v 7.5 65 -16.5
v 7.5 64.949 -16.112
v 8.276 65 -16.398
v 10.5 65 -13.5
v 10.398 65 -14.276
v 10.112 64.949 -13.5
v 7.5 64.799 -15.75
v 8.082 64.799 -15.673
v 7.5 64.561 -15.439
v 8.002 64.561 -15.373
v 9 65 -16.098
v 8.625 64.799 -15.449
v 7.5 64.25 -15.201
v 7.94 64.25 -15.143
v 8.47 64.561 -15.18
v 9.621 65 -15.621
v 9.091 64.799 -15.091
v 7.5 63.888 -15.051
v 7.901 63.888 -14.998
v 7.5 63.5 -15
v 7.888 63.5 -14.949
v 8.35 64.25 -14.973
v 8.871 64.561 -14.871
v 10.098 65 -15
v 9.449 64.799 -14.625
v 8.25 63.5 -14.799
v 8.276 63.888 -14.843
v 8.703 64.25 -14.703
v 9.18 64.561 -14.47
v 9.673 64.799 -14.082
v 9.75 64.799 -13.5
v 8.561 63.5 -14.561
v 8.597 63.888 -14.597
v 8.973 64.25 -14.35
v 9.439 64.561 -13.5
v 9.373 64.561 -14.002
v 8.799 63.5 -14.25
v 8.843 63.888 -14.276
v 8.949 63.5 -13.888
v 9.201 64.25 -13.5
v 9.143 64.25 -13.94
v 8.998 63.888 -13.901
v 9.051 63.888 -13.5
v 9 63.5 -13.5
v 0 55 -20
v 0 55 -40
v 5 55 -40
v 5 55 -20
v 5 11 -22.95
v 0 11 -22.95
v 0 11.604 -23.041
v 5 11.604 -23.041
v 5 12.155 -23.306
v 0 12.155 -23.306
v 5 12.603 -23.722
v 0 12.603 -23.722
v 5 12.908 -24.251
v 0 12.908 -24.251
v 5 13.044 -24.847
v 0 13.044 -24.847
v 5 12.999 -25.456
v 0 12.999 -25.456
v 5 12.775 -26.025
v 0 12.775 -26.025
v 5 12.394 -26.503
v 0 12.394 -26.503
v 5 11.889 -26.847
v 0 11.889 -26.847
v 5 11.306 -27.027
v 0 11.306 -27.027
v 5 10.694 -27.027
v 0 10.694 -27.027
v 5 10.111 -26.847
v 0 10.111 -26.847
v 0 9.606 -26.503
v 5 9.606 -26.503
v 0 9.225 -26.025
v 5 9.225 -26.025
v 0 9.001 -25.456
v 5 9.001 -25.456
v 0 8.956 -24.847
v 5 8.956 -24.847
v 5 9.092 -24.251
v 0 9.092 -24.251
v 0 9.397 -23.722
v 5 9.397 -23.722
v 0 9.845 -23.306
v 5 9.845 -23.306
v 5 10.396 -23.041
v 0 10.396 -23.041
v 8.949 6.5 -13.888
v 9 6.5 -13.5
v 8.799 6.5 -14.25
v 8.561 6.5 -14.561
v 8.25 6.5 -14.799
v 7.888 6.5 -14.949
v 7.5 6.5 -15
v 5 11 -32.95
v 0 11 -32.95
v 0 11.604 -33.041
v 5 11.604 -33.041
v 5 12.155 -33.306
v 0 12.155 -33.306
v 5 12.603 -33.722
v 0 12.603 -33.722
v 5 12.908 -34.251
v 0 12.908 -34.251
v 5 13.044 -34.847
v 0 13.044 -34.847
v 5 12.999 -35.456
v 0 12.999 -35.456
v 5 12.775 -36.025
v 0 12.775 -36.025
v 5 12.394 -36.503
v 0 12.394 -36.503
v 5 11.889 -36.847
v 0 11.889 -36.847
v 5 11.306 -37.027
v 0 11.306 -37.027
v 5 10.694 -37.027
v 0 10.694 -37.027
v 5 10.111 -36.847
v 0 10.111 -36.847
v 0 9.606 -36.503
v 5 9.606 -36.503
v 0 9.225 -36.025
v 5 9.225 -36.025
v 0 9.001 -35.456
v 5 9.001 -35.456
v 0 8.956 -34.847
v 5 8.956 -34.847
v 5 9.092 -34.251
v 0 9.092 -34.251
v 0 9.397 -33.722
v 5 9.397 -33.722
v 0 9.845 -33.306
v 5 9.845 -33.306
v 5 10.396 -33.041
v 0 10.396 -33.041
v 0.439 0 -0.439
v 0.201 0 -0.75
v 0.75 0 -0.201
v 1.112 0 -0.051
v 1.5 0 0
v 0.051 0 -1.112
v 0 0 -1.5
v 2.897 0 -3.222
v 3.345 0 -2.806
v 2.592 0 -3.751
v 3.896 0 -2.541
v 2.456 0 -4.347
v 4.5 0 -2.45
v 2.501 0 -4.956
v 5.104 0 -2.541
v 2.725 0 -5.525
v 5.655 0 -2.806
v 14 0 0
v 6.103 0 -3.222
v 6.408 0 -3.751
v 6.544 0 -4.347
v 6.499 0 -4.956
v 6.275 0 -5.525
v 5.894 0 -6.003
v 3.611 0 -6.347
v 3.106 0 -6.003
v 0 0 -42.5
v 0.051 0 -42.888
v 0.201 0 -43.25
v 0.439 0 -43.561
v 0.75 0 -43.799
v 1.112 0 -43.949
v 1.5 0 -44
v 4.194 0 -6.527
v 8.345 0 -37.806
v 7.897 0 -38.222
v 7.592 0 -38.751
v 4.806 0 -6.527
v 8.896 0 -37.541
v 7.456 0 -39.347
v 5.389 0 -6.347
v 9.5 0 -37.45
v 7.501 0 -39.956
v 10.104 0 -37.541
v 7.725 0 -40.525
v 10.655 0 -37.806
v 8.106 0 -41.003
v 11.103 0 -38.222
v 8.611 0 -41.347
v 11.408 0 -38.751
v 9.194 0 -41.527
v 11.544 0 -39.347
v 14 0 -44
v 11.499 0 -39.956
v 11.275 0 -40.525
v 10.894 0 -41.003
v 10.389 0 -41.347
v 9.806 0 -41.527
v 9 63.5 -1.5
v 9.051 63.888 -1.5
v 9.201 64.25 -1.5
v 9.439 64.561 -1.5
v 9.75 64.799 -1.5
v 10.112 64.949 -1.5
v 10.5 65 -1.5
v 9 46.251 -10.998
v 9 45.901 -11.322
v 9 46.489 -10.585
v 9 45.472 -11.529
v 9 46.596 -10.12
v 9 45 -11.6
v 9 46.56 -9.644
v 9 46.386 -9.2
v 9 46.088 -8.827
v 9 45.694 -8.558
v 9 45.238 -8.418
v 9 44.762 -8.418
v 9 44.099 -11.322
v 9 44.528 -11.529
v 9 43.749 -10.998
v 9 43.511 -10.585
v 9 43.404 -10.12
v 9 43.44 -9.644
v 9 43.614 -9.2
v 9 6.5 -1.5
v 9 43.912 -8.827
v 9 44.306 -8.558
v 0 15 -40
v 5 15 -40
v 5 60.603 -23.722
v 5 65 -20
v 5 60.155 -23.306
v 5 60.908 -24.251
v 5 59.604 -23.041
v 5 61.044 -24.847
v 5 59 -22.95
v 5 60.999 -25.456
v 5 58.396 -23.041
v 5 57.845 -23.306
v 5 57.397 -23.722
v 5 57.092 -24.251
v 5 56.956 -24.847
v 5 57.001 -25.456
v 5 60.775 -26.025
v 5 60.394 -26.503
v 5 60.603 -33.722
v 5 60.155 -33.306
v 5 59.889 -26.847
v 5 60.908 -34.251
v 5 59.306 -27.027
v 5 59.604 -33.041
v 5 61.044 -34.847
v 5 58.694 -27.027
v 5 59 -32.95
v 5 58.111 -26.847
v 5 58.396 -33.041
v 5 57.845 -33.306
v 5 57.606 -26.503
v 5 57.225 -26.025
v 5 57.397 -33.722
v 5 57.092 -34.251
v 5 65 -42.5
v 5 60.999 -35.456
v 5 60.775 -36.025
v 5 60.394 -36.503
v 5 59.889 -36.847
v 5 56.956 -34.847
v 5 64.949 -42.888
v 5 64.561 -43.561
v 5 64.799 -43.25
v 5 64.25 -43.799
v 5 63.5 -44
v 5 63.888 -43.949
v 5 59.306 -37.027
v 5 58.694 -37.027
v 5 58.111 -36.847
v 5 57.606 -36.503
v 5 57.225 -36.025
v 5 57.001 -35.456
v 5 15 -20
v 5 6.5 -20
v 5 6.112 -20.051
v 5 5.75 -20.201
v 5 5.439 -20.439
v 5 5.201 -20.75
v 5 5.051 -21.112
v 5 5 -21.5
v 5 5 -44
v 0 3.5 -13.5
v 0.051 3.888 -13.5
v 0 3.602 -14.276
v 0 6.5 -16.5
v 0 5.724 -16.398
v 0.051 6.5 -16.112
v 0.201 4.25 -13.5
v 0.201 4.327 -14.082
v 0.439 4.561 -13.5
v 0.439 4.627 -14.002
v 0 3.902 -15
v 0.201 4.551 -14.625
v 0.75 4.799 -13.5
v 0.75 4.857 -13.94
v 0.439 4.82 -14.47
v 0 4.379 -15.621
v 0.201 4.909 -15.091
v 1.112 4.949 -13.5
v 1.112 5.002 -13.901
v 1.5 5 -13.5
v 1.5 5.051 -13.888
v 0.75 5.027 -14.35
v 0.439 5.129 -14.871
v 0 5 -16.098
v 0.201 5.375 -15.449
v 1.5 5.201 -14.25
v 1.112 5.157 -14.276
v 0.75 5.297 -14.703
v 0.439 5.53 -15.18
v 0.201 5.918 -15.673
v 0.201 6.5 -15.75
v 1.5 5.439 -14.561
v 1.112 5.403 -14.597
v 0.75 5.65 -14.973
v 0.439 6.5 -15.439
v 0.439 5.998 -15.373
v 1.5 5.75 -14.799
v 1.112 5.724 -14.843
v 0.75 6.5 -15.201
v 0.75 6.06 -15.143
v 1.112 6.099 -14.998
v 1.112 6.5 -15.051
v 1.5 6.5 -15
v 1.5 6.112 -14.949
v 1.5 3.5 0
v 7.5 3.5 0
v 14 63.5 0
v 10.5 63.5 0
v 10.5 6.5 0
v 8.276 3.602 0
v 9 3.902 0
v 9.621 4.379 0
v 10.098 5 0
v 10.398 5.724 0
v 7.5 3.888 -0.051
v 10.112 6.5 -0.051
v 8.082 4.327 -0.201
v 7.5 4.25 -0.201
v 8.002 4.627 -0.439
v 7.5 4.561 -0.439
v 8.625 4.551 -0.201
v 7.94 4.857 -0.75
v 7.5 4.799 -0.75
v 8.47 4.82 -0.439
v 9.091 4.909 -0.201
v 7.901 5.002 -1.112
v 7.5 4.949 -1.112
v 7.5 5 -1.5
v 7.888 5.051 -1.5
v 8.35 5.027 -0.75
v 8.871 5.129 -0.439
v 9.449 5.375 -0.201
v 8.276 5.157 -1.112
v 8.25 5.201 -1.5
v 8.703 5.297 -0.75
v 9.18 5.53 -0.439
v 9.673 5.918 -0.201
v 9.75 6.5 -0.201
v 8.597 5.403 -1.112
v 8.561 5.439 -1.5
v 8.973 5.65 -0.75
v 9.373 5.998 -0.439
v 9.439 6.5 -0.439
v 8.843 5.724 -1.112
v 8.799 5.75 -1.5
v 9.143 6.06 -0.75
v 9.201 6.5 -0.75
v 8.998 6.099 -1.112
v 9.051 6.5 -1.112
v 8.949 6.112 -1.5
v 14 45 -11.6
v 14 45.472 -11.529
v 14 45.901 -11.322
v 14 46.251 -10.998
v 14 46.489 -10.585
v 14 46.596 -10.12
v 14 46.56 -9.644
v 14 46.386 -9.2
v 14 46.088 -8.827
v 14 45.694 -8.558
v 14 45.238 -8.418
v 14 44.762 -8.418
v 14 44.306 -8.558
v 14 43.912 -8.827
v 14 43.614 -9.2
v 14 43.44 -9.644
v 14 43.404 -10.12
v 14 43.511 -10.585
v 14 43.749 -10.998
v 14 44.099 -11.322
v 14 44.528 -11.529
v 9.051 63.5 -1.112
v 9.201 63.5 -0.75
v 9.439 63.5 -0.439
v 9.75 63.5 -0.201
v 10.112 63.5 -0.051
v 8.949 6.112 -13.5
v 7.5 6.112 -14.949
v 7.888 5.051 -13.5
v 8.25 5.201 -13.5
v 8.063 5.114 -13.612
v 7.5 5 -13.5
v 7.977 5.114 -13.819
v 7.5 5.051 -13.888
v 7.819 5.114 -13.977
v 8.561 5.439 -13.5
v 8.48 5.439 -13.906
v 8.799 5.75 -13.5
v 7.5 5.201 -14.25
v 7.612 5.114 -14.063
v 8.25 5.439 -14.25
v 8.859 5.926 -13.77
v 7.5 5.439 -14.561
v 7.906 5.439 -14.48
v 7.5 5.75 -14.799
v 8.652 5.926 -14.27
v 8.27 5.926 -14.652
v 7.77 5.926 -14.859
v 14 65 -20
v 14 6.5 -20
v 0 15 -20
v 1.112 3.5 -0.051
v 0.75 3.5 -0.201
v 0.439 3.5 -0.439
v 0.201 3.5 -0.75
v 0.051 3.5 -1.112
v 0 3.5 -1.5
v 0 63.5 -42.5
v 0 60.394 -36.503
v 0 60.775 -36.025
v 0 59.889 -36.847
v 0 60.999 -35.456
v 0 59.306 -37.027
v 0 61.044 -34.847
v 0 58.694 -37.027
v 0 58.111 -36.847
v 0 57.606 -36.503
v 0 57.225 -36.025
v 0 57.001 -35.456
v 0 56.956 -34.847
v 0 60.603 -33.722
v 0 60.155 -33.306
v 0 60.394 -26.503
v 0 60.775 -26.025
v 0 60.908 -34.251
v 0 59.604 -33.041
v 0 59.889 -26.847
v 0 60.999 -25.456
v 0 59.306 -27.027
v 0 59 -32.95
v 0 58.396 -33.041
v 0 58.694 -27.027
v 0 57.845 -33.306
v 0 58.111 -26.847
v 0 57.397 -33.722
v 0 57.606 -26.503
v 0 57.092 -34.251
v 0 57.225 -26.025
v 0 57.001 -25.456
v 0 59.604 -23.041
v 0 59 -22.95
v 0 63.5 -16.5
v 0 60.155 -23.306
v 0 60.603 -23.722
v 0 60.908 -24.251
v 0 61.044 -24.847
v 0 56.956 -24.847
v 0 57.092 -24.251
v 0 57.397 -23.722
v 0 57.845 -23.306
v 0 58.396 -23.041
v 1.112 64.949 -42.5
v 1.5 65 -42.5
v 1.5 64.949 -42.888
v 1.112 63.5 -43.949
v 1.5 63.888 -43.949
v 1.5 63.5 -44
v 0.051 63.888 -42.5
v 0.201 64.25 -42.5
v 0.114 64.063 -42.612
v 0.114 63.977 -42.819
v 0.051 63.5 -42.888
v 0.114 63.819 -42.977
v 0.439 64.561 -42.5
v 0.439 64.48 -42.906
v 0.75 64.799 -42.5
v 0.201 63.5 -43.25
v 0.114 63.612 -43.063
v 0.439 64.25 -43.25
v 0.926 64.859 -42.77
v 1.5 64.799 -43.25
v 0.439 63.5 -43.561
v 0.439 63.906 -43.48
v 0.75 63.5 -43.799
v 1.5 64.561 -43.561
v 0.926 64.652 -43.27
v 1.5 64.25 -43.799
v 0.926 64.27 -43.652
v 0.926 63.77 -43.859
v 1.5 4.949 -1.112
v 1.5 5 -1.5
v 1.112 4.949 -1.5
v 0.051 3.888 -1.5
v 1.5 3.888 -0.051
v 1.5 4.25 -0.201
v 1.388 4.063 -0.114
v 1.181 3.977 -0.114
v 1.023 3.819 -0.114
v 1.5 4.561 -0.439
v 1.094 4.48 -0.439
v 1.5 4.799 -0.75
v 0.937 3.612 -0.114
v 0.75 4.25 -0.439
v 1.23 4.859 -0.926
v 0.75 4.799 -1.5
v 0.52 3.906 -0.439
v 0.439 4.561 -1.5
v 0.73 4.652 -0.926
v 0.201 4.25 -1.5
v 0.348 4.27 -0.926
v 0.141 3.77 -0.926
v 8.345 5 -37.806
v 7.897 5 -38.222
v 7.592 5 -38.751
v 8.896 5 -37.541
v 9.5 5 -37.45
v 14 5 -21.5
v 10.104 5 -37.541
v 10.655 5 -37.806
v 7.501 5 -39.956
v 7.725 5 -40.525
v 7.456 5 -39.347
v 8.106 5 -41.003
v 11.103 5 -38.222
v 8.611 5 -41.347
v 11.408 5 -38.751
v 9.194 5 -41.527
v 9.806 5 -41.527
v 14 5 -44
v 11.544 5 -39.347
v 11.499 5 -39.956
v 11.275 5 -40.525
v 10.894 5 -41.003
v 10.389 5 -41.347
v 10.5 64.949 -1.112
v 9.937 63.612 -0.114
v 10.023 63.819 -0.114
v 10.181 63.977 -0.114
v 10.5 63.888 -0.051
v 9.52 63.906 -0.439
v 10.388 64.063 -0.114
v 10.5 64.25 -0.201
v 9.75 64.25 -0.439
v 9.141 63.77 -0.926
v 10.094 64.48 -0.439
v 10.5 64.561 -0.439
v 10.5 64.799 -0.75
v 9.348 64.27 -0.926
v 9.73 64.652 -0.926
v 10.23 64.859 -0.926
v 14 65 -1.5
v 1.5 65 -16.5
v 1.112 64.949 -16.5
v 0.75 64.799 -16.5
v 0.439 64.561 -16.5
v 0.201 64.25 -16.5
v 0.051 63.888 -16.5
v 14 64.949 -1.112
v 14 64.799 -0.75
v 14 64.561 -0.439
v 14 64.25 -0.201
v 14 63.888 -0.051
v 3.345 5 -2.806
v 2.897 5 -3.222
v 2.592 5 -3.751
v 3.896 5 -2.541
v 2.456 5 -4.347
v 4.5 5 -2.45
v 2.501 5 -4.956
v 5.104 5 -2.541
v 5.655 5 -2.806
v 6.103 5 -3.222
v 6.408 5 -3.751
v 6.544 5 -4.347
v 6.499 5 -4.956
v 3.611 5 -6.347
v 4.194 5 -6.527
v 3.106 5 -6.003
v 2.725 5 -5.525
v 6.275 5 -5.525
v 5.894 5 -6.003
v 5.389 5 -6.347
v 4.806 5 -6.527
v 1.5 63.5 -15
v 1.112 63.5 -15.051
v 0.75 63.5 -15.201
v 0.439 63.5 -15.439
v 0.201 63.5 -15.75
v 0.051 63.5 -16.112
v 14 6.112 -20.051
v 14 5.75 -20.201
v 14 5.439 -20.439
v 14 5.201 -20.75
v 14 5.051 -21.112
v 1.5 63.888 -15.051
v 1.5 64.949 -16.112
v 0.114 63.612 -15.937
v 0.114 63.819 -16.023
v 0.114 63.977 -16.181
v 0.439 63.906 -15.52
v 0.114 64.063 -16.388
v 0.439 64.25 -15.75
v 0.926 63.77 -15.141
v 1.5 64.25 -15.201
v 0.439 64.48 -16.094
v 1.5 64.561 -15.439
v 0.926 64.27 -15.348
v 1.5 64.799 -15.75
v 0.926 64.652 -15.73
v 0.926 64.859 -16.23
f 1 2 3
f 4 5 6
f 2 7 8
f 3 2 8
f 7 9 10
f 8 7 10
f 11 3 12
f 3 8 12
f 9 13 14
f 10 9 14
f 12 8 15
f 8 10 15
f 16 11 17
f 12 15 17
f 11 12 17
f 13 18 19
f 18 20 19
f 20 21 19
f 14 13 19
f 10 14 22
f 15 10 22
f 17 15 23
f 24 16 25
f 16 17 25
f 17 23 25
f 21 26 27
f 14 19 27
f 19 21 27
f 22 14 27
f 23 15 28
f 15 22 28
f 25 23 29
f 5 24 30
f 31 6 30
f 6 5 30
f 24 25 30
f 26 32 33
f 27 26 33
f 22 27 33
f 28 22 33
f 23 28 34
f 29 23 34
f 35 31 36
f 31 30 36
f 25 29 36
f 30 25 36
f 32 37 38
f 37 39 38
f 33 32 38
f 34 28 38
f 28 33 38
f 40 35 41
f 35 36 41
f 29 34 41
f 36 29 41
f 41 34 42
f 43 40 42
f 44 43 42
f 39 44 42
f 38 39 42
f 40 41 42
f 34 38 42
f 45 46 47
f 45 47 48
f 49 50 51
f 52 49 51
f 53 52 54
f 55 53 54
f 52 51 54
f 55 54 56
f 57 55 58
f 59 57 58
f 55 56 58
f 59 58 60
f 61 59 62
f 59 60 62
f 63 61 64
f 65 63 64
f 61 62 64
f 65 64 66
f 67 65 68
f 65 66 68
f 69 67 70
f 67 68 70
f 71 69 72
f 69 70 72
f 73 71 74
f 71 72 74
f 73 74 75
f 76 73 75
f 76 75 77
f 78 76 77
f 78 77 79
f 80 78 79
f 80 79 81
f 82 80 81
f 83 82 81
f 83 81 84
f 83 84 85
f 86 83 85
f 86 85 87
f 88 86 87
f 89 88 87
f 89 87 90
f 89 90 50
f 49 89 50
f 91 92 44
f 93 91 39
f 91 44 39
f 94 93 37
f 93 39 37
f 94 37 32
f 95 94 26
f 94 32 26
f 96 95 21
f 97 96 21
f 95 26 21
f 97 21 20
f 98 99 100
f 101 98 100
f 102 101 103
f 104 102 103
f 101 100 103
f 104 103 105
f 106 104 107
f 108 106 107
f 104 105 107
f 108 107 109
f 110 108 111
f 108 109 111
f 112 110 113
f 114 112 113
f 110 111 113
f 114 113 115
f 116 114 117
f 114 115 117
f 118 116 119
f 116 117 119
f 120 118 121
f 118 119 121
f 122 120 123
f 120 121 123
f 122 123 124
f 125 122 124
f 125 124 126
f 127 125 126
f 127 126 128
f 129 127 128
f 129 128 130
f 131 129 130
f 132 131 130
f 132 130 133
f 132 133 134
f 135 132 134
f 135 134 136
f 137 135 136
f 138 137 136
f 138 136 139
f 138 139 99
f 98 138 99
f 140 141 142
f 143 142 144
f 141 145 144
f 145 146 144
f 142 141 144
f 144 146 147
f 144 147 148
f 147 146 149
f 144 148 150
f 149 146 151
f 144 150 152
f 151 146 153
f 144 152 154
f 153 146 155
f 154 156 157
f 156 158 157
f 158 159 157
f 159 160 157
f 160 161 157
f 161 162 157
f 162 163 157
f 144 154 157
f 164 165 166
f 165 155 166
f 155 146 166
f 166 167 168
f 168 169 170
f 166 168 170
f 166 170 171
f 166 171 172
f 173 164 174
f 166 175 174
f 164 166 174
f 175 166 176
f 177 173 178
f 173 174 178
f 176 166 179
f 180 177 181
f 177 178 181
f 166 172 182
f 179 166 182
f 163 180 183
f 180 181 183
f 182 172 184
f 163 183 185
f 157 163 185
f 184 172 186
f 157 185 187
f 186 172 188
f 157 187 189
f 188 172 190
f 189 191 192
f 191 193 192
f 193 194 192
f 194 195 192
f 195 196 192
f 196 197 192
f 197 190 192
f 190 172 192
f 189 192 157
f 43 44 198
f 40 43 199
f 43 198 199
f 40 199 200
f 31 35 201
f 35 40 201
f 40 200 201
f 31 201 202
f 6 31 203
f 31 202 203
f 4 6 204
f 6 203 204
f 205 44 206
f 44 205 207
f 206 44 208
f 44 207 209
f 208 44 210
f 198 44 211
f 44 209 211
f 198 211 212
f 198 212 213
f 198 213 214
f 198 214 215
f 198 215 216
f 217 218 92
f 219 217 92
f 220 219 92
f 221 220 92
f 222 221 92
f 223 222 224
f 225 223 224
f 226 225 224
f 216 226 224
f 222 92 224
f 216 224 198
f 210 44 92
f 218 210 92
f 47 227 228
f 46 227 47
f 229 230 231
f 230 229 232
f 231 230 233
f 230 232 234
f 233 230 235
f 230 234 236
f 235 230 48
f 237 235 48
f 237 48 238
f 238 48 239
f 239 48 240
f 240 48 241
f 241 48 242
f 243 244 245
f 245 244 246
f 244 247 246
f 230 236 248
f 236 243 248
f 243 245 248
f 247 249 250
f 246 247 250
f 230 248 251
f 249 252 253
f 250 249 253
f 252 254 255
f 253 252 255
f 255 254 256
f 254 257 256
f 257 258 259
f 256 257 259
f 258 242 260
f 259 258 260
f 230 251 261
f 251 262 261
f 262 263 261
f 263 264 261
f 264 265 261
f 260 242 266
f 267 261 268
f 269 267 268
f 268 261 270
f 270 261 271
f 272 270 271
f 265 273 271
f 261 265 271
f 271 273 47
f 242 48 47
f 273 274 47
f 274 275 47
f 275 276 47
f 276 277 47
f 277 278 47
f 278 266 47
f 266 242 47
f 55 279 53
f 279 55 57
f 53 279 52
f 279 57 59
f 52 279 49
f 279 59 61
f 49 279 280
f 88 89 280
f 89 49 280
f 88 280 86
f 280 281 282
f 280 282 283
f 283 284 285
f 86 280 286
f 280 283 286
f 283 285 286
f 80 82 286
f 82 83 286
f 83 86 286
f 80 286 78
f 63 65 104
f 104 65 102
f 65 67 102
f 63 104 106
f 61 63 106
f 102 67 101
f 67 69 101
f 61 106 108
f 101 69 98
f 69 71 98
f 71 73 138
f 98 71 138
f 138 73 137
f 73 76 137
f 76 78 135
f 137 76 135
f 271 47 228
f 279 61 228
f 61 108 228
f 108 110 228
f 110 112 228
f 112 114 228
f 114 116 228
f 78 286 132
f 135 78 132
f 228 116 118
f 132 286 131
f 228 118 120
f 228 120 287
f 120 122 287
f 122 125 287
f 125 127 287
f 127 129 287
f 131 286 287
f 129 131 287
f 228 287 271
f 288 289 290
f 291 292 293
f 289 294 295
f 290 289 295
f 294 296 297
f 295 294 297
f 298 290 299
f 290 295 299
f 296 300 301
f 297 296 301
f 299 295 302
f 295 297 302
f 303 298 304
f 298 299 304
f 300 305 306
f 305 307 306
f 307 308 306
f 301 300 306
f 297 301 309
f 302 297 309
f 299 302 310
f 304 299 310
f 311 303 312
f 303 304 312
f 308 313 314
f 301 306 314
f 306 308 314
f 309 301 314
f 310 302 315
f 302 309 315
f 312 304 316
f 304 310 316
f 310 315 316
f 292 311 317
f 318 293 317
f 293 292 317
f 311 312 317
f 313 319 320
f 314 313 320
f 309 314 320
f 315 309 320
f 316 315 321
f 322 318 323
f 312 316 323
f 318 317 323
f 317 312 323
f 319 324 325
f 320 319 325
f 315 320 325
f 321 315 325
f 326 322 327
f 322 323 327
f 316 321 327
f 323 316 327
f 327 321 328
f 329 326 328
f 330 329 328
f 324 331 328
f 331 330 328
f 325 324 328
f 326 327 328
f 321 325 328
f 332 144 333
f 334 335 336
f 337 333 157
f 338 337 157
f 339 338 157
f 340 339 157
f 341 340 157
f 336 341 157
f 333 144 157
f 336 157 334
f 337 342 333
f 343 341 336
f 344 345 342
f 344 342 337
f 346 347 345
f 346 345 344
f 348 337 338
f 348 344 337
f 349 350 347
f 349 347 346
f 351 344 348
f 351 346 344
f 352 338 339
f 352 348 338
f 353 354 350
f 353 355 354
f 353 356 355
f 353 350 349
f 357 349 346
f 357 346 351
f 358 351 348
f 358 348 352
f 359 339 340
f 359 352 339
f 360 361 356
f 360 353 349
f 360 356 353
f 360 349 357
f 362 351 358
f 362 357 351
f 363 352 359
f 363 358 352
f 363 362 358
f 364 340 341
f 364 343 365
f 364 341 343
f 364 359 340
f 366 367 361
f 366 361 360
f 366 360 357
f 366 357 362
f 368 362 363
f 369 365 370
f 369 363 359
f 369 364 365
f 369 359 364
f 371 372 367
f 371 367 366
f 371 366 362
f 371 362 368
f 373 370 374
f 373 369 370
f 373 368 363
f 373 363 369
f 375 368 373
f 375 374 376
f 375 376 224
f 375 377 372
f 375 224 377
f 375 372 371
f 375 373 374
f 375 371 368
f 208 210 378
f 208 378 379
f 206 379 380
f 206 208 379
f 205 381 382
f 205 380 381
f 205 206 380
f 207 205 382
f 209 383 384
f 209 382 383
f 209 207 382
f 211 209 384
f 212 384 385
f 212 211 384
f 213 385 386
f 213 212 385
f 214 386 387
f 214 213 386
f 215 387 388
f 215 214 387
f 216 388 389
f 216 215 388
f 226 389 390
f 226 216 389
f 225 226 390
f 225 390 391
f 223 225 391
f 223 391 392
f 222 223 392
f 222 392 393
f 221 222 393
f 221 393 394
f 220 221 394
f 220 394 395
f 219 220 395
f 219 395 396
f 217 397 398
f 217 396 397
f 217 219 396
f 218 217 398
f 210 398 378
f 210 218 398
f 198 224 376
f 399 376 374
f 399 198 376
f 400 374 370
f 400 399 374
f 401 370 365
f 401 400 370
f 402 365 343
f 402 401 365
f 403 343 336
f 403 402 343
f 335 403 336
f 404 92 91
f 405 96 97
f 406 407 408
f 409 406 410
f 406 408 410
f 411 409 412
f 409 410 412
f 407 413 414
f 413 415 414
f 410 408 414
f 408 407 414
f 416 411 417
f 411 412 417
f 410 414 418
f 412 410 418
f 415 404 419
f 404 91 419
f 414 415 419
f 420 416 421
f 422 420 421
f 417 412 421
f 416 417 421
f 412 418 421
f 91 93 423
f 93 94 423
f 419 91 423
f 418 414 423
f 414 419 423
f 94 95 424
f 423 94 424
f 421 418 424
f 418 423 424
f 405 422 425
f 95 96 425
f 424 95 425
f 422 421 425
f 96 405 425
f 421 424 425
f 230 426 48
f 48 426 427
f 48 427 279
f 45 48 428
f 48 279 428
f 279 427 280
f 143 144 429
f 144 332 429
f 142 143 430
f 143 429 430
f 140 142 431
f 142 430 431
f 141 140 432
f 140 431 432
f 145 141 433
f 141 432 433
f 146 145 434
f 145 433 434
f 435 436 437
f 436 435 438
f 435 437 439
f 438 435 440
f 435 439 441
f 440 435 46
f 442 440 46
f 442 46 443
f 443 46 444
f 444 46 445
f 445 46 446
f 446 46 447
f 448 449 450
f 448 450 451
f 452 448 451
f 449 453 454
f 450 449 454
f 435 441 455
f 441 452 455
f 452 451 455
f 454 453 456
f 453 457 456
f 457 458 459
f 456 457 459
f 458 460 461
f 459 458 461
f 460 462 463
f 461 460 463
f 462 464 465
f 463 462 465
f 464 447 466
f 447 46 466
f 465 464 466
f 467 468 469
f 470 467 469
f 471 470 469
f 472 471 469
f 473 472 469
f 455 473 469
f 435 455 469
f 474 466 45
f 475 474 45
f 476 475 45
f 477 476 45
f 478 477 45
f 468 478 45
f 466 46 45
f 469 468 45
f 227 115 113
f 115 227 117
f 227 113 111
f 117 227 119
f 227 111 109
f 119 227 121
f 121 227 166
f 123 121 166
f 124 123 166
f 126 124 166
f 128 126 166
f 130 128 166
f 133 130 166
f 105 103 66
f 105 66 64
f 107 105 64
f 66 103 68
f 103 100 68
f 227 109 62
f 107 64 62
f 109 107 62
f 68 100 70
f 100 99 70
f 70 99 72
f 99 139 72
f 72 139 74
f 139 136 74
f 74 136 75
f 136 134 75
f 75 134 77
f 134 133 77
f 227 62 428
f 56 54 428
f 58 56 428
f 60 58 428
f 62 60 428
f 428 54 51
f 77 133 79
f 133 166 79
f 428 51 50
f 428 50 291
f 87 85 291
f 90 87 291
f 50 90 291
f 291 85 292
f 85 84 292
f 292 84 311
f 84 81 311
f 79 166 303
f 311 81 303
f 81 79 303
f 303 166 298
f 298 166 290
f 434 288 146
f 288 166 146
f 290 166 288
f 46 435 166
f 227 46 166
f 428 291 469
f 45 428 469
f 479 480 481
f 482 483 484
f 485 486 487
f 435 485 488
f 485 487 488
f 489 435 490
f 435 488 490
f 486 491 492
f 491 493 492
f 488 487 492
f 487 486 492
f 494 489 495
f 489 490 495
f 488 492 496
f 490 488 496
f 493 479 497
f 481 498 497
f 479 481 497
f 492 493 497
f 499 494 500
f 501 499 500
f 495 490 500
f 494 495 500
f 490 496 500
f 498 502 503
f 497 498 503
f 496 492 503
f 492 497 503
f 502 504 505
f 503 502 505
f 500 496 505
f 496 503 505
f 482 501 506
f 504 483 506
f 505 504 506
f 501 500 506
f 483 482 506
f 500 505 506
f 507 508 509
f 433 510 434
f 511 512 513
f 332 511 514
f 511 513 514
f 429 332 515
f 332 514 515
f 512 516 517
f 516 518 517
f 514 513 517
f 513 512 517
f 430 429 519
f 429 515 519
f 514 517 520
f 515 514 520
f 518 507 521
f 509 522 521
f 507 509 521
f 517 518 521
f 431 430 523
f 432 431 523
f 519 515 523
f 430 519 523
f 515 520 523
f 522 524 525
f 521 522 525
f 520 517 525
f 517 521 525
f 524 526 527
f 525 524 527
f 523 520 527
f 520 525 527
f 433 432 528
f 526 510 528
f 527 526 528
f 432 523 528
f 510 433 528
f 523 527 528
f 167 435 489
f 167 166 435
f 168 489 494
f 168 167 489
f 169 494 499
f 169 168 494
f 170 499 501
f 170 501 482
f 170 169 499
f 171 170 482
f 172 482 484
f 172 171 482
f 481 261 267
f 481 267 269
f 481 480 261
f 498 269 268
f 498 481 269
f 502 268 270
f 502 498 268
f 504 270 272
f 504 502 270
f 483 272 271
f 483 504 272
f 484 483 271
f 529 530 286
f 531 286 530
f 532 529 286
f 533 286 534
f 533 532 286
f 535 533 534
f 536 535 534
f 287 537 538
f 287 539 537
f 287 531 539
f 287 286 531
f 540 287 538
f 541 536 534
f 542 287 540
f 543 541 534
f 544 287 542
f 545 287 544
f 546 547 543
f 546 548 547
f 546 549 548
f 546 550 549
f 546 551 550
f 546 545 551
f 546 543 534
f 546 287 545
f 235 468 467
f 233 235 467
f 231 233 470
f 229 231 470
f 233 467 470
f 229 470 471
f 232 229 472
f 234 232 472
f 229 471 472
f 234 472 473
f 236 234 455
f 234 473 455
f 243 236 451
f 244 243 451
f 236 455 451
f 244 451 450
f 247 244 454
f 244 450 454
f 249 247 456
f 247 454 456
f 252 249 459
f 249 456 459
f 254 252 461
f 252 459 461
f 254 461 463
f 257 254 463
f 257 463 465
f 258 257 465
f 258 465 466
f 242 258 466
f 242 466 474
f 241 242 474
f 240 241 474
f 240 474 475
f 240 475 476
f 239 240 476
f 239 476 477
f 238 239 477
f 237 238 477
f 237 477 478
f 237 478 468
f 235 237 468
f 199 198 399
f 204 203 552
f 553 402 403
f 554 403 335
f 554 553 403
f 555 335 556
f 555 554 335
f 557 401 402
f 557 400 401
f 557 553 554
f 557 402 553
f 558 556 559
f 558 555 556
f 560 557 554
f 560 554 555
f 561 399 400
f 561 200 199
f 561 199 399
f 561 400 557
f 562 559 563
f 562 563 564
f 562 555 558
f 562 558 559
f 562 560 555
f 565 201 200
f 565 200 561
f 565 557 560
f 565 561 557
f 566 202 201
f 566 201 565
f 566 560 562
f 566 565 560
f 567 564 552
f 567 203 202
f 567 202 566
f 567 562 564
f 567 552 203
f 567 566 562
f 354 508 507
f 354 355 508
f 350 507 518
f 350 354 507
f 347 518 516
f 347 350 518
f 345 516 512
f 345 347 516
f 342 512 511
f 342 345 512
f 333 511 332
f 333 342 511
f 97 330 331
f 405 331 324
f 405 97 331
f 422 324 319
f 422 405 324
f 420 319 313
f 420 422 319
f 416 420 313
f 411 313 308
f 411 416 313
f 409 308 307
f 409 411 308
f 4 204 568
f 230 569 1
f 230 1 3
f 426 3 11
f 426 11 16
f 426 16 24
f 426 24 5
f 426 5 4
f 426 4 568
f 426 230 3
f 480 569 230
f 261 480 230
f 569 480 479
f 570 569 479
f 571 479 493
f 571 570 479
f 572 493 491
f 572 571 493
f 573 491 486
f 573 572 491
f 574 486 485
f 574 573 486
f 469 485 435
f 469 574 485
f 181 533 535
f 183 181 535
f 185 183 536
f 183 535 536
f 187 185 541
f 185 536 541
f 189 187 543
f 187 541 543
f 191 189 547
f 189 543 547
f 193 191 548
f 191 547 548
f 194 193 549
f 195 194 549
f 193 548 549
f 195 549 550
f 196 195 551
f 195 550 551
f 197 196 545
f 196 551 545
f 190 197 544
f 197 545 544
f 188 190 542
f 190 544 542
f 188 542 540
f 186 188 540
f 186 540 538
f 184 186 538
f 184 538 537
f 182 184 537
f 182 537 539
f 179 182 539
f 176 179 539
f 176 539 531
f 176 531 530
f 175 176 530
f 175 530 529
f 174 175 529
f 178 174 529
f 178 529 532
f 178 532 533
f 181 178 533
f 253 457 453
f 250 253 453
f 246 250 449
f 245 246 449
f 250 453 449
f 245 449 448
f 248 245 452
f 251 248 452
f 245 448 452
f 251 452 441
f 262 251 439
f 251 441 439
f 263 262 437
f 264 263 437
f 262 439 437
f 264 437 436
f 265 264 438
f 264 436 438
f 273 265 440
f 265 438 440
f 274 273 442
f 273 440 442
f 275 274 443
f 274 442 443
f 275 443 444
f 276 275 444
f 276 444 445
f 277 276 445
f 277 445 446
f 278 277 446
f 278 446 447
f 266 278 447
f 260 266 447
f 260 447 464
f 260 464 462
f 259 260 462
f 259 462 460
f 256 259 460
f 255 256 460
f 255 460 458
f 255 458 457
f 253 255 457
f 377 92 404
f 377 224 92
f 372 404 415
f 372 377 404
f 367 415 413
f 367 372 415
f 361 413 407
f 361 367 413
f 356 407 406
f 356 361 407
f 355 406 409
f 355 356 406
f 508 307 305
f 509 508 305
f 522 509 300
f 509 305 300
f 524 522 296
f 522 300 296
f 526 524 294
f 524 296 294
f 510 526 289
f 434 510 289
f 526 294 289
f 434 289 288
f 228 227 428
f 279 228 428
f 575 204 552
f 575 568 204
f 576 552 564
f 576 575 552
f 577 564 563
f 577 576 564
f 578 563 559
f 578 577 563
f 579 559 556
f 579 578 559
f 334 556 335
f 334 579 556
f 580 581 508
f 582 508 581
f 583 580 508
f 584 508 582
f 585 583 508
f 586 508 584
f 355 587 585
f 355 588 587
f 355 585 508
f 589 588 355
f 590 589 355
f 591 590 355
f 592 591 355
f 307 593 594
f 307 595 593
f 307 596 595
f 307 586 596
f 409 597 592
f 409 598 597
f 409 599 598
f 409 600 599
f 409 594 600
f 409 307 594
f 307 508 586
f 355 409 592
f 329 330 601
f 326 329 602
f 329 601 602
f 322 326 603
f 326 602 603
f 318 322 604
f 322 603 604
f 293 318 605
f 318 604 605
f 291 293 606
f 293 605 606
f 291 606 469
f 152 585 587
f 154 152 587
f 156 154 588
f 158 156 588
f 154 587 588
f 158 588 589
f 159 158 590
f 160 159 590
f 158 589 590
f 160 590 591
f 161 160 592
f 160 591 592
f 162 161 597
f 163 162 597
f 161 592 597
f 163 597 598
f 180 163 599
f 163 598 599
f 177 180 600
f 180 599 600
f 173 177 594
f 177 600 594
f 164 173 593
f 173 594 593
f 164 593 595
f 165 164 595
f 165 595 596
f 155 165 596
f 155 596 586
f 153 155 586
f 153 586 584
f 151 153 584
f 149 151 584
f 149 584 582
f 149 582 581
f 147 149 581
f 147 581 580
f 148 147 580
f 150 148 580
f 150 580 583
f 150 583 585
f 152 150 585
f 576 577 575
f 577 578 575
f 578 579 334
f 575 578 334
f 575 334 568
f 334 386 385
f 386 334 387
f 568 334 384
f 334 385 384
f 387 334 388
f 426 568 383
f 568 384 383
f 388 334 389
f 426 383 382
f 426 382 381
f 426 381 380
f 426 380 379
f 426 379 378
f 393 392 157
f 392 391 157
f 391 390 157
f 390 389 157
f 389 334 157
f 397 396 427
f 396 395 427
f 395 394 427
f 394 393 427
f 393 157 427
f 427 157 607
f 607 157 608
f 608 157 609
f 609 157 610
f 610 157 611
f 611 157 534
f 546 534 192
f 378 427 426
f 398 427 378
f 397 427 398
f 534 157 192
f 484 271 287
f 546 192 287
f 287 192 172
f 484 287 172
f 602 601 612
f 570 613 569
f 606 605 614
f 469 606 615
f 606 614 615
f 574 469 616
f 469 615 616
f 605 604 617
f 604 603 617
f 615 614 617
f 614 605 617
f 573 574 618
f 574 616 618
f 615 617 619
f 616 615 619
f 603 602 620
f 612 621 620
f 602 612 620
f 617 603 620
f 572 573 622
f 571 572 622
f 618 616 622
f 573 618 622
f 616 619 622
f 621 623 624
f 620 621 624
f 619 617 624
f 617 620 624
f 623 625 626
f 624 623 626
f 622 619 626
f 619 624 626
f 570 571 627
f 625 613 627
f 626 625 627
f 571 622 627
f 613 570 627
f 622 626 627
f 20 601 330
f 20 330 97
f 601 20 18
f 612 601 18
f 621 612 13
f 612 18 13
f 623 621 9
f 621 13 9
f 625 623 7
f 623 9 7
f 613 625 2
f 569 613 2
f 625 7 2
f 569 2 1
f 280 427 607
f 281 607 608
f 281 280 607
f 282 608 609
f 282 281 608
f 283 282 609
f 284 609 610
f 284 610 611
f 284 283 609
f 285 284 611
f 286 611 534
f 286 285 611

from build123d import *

# Parameters (mm, degrees)
ESQUISSE5_W                  = 14
ESQUISSE5_H                  = 44
BOSS_EXTRU_2_DEPTH           = 5
BOSS_EXTRU_3_DEPTH           = 60
ENL_V_MAT_EXTRU_2_DEPTH      = 80.730797061
ENL_V_MAT_EXTRU_2_DEPTH_BACK = 80.730797061
ESQUISSE8_R                  = 1.6
ESQUISSE10_R                 = 2.05
ESQUISSE10_W                 = 20
ESQUISSE10_H                 = 40
ESQUISSE10_R_2               = 1.6
ENL_V_MAT_EXTRU_3_DEPTH      = 80.730797061
ESQUISSE11_R                 = 2.05
ENL_V_MAT_EXTRU_4_DEPTH      = 76.709972923
CONG_3_R                     = 1.5


with BuildPart() as part:
    # Esquisse5 → Boss.-Extru.2 (new body)
    with BuildSketch(Plane(origin=(0, 0, 0), x_dir=(1, 0, 0), z_dir=(0, 1, 0))):
        with Locations((7, 22)):
            Rectangle(ESQUISSE5_W, ESQUISSE5_H)
    extrude(amount=BOSS_EXTRU_2_DEPTH)

    # Esquisse6 → Boss.-Extru.3 (add)
    with BuildSketch(Plane(origin=(0, 5, 0), x_dir=(1, 0, 0), z_dir=(0, 1, 0))):
        Polygon((9, 15), (9, 0), (14, 0), (14, 20), (5, 20), (5, 44), (0, 44), (0, 15), align=None)
    extrude(amount=BOSS_EXTRU_3_DEPTH)

    # Esquisse8 → Enlèv. mat.-Extru.2 (cut, two sides: drawn at the far end of the back side and taken through both)
    with BuildSketch(Plane(origin=(0, 0, 0), x_dir=(0, 0, -1), z_dir=(1, 0, 0)).offset(-ENL_V_MAT_EXTRU_2_DEPTH_BACK)):
        with Locations((30, 25)):
            Circle(ESQUISSE8_R)
        with Locations((10, 45)):
            Circle(ESQUISSE8_R)
    extrude(amount=ENL_V_MAT_EXTRU_2_DEPTH + ENL_V_MAT_EXTRU_2_DEPTH_BACK, mode=Mode.SUBTRACT)

    # Esquisse10 → Enlèv. mat.-Extru.3 (cut, through all)
    # profile 1 of 5: a face of its own
    with BuildSketch(Plane.ZY):
        with Locations((-25, 11)):
            Circle(ESQUISSE10_R)
    # profile 2 of 5: a face of its own
    with BuildSketch(Plane.ZY):
        with Locations((-35, 11)):
            Circle(ESQUISSE10_R)
    # profile 3 of 5: a face of its own
    with BuildSketch(Plane.ZY):
        with Locations((-30, 35)):
            Rectangle(ESQUISSE10_W, ESQUISSE10_H)
        with Locations((-30, 25)):
            Circle(ESQUISSE10_R_2, mode=Mode.SUBTRACT)
    # profile 4 of 5: a face of its own
    with BuildSketch(Plane.ZY):
        with Locations((-25, 59)):
            Circle(ESQUISSE10_R)
    # profile 5 of 5: a face of its own
    with BuildSketch(Plane.ZY):
        with Locations((-35, 59)):
            Circle(ESQUISSE10_R)
    extrude(amount=-ENL_V_MAT_EXTRU_3_DEPTH, mode=Mode.SUBTRACT)

    # Esquisse11 → Enlèv. mat.-Extru.4 (cut, through all)
    with BuildSketch(Plane(origin=(0, 5, 0), x_dir=(1, 0, 0), z_dir=(0, 1, 0))):
        with Locations(Location((9.5, 39.5, 0), (0, 0, 270))):
            Circle(ESQUISSE11_R)
        with Locations(Location((4.5, 4.5, 0), (0, 0, 270))):
            Circle(ESQUISSE11_R)
    extrude(amount=-ENL_V_MAT_EXTRU_4_DEPTH, mode=Mode.SUBTRACT)

    # Congé3
    cong_3_edges = [part.edges().sort_by_distance(p)[0] for p in [
        (0, 5, -7.5),
        (4.5, 65, -15),
        (0, 35, -15),
        (9, 65, -7.5),
        (9, 35, -15),
        (9, 35, 0),
        (2.5, 65, -44),
        (0, 65, -29.5),
        (11.5, 65, 0),
        (9.5, 5, -20),
        (9, 5, -7.5),
        (4.5, 5, -15),
        (4.5, 5, 0),
        (0, 2.5, 0),
        (0, 32.5, -44),
    ]]
    fillet(cong_3_edges, radius=CONG_3_R)


solid = part.part
